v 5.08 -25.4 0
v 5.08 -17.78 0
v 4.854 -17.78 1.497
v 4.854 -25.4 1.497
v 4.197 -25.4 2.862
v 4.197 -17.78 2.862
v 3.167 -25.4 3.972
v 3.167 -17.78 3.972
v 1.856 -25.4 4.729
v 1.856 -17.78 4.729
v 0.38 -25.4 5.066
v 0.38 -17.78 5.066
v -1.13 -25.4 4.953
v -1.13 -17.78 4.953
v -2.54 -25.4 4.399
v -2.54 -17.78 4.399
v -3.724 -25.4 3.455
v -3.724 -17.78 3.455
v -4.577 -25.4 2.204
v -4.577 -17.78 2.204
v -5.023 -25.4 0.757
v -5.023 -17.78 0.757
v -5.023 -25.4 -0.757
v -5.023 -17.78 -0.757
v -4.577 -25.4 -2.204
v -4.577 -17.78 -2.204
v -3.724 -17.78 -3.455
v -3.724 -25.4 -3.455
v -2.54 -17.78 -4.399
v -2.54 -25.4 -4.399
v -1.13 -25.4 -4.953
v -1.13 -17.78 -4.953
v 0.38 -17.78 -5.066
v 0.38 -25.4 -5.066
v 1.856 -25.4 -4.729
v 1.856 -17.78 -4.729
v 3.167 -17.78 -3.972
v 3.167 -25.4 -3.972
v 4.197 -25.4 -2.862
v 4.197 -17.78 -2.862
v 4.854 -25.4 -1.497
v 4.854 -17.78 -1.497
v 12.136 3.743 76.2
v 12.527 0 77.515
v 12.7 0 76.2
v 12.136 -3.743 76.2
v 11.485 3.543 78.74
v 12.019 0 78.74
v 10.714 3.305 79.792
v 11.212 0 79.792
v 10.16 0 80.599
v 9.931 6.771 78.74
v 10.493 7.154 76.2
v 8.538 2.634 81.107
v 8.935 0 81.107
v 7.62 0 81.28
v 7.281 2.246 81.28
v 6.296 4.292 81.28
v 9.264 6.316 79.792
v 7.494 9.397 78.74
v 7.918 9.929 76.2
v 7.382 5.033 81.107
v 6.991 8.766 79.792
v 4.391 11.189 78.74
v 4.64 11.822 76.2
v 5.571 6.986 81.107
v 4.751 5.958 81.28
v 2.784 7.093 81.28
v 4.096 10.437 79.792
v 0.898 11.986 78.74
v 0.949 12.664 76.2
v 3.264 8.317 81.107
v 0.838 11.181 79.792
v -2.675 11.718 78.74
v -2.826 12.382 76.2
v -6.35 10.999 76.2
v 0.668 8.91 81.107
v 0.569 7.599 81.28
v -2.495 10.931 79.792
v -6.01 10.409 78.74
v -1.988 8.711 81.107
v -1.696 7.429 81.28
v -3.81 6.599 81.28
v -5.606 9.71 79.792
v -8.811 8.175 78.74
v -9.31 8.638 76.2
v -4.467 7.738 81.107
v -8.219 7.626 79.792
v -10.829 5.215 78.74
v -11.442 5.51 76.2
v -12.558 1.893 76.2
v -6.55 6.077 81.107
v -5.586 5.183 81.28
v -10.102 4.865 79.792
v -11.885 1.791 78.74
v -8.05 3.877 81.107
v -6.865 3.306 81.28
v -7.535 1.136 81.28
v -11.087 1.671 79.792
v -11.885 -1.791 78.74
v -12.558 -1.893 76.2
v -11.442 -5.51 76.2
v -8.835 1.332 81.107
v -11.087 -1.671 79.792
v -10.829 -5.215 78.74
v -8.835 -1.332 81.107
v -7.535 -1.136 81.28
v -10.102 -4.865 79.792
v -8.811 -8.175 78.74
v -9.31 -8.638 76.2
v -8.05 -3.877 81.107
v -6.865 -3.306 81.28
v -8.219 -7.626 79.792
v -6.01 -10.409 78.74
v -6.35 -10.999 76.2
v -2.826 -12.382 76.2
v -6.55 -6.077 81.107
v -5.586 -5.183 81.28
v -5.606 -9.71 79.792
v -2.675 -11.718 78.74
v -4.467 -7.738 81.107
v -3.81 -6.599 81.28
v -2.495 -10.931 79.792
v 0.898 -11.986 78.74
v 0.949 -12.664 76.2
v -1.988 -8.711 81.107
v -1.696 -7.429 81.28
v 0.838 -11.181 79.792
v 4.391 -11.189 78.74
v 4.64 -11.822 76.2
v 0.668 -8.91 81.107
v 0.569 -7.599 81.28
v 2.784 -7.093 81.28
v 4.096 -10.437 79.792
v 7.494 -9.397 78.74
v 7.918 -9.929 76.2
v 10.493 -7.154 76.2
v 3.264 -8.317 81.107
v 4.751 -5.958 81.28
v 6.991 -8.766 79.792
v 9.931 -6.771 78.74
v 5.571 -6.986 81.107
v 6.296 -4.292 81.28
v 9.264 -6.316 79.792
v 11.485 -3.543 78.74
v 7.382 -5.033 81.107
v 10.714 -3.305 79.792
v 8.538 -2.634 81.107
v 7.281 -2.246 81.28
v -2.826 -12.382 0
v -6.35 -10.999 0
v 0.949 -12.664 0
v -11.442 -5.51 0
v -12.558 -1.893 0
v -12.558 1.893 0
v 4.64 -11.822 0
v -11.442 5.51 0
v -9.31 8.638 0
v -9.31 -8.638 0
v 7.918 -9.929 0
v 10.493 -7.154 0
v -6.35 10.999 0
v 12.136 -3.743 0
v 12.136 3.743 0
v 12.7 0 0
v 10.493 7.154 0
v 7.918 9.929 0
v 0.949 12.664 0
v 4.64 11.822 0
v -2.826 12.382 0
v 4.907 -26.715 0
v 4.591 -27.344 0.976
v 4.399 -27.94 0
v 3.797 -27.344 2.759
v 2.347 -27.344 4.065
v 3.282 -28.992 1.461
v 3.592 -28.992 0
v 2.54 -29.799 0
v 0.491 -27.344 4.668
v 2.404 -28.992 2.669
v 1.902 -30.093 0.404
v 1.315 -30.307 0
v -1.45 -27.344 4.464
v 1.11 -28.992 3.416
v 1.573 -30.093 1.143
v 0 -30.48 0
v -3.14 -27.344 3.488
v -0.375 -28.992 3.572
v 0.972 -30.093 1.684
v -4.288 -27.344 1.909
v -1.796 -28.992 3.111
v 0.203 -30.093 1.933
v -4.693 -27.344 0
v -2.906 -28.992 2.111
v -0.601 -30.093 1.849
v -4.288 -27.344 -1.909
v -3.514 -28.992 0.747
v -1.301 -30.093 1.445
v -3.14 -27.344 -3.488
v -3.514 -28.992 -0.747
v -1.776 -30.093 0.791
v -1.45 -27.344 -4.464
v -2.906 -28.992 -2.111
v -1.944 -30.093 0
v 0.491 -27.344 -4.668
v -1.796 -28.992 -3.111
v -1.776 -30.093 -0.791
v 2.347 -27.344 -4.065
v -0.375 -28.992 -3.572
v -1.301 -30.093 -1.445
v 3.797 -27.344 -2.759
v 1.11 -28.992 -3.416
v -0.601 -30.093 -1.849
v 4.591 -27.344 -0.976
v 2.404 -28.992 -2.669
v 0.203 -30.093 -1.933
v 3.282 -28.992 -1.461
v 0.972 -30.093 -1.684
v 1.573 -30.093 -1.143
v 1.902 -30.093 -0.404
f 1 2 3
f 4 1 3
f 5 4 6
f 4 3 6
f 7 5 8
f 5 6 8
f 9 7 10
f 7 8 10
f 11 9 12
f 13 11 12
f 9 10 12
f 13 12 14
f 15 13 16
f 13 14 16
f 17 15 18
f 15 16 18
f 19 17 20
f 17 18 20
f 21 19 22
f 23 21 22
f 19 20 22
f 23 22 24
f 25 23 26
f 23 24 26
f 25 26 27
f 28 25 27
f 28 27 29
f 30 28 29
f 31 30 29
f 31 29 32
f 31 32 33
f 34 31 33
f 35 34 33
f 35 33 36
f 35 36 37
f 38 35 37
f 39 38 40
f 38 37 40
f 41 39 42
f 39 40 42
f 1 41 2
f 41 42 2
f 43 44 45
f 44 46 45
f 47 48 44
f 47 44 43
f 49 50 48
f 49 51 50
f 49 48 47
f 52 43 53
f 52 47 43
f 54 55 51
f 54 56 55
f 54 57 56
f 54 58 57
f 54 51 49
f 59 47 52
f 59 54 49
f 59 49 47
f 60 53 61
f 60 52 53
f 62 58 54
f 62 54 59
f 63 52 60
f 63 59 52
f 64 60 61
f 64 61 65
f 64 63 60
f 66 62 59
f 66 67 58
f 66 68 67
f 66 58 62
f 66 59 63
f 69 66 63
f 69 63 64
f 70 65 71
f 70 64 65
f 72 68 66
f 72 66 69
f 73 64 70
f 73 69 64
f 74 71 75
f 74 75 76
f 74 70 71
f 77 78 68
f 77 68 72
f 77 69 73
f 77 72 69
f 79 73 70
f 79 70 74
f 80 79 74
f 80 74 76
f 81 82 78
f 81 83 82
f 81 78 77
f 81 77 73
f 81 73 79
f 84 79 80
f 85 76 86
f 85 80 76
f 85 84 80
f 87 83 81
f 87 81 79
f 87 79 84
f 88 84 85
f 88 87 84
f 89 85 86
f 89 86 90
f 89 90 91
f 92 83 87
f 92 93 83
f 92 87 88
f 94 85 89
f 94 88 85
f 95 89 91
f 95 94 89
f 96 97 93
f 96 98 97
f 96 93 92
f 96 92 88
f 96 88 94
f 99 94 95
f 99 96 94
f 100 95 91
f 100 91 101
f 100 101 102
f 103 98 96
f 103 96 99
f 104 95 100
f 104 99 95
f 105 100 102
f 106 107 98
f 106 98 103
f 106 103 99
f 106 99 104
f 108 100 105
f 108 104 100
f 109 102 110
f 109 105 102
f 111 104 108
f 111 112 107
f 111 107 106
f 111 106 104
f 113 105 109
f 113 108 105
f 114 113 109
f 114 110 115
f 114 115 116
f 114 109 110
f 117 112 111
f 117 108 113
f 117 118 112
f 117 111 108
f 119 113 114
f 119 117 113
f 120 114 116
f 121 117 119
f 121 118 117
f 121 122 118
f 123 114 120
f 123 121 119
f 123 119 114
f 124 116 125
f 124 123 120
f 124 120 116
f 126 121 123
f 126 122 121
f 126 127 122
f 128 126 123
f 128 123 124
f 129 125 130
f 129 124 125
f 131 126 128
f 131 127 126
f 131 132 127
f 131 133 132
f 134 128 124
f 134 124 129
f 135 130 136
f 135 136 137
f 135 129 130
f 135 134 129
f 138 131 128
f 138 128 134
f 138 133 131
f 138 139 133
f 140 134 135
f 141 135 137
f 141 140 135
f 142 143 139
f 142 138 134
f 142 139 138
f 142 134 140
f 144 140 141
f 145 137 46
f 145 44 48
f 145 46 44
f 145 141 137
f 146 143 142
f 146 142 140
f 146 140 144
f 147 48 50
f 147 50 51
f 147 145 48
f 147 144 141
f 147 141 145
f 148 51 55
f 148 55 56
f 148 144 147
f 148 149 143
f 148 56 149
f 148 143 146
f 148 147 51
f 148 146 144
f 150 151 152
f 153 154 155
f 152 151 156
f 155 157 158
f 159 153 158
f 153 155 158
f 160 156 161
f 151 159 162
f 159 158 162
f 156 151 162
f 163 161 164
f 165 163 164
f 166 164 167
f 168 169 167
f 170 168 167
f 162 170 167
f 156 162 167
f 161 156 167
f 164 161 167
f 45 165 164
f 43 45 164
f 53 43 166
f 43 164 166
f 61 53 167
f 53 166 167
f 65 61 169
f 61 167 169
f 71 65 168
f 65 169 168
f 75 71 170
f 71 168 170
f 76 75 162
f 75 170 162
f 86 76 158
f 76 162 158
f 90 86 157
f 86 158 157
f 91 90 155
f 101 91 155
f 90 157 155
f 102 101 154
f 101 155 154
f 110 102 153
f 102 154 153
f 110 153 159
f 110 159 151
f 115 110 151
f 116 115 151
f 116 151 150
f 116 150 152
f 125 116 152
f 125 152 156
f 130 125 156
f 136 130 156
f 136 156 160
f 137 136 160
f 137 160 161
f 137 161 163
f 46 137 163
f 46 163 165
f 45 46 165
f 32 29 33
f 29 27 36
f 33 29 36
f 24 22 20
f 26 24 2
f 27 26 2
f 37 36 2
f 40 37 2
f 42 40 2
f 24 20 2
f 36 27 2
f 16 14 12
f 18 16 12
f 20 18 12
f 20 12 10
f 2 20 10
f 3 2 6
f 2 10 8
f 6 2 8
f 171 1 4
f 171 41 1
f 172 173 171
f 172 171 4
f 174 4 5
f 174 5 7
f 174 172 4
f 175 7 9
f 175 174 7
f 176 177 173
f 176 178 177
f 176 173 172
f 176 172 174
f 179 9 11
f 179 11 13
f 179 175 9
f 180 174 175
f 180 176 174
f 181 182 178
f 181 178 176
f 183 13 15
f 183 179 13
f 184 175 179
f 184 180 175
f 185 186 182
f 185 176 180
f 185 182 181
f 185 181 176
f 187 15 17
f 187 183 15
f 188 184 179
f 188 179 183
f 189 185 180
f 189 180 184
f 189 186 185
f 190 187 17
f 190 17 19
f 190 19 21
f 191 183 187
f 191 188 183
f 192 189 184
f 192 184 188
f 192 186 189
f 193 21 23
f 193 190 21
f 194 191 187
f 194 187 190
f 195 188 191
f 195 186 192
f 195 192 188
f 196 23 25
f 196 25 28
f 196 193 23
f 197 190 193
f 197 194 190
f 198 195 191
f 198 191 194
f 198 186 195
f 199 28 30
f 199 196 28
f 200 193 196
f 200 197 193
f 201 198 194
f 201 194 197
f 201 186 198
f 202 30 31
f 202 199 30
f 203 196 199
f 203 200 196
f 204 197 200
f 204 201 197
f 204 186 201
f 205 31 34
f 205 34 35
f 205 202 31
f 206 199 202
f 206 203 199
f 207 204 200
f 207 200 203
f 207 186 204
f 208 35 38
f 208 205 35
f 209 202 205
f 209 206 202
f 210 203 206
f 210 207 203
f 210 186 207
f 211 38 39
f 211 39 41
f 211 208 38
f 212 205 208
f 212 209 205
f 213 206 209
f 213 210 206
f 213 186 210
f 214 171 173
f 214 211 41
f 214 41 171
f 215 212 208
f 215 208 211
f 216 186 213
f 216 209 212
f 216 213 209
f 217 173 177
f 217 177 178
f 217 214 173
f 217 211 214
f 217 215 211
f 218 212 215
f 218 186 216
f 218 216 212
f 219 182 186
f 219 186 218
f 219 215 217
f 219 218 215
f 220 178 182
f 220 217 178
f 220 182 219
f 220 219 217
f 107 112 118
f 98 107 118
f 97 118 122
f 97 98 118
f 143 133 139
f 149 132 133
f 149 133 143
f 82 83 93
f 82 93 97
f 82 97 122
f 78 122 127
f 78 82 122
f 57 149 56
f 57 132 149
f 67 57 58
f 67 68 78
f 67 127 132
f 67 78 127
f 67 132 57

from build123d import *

# Parameters (mm, degrees)
F0_R      = 12.7
F1_DEPTH  = 76.2
F2_DEPTH  = 5.08
F3_R      = 5.08
F9_R      = 5.08
F10_DEPTH = 12.7
F11_R     = 5.08


with BuildPart() as f1:
    # F0 (on Top) → F1 (new body)
    with BuildSketch(Plane.XY):
        Circle(F0_R)
    extrude(amount=F1_DEPTH)

    # F2 (add): a face of the model
    f2_faces = [f1.faces().sort_by_distance(p)[0] for p in [
        (0, 0, 76.2),
    ]]
    extrude(f2_faces, amount=F2_DEPTH)

    # F3
    f3_edges = [f1.edges().sort_by_distance(p)[0] for p in [
        (-12.7, 0, 81.28),
    ]]
    fillet(f3_edges, radius=F3_R)


with BuildPart() as f10:
    # F9 (on plane+point) → F10 (new body)
    with BuildSketch(Plane.XZ.offset(17.78)):
        Circle(F9_R)
    extrude(amount=F10_DEPTH)

    # F11
    f11_edges = [f10.edges().sort_by_distance(p)[0] for p in [
        (-5.08, -30.48, 0),
    ]]
    fillet(f11_edges, radius=F11_R)


solid = Compound([f1.part, f10.part])
